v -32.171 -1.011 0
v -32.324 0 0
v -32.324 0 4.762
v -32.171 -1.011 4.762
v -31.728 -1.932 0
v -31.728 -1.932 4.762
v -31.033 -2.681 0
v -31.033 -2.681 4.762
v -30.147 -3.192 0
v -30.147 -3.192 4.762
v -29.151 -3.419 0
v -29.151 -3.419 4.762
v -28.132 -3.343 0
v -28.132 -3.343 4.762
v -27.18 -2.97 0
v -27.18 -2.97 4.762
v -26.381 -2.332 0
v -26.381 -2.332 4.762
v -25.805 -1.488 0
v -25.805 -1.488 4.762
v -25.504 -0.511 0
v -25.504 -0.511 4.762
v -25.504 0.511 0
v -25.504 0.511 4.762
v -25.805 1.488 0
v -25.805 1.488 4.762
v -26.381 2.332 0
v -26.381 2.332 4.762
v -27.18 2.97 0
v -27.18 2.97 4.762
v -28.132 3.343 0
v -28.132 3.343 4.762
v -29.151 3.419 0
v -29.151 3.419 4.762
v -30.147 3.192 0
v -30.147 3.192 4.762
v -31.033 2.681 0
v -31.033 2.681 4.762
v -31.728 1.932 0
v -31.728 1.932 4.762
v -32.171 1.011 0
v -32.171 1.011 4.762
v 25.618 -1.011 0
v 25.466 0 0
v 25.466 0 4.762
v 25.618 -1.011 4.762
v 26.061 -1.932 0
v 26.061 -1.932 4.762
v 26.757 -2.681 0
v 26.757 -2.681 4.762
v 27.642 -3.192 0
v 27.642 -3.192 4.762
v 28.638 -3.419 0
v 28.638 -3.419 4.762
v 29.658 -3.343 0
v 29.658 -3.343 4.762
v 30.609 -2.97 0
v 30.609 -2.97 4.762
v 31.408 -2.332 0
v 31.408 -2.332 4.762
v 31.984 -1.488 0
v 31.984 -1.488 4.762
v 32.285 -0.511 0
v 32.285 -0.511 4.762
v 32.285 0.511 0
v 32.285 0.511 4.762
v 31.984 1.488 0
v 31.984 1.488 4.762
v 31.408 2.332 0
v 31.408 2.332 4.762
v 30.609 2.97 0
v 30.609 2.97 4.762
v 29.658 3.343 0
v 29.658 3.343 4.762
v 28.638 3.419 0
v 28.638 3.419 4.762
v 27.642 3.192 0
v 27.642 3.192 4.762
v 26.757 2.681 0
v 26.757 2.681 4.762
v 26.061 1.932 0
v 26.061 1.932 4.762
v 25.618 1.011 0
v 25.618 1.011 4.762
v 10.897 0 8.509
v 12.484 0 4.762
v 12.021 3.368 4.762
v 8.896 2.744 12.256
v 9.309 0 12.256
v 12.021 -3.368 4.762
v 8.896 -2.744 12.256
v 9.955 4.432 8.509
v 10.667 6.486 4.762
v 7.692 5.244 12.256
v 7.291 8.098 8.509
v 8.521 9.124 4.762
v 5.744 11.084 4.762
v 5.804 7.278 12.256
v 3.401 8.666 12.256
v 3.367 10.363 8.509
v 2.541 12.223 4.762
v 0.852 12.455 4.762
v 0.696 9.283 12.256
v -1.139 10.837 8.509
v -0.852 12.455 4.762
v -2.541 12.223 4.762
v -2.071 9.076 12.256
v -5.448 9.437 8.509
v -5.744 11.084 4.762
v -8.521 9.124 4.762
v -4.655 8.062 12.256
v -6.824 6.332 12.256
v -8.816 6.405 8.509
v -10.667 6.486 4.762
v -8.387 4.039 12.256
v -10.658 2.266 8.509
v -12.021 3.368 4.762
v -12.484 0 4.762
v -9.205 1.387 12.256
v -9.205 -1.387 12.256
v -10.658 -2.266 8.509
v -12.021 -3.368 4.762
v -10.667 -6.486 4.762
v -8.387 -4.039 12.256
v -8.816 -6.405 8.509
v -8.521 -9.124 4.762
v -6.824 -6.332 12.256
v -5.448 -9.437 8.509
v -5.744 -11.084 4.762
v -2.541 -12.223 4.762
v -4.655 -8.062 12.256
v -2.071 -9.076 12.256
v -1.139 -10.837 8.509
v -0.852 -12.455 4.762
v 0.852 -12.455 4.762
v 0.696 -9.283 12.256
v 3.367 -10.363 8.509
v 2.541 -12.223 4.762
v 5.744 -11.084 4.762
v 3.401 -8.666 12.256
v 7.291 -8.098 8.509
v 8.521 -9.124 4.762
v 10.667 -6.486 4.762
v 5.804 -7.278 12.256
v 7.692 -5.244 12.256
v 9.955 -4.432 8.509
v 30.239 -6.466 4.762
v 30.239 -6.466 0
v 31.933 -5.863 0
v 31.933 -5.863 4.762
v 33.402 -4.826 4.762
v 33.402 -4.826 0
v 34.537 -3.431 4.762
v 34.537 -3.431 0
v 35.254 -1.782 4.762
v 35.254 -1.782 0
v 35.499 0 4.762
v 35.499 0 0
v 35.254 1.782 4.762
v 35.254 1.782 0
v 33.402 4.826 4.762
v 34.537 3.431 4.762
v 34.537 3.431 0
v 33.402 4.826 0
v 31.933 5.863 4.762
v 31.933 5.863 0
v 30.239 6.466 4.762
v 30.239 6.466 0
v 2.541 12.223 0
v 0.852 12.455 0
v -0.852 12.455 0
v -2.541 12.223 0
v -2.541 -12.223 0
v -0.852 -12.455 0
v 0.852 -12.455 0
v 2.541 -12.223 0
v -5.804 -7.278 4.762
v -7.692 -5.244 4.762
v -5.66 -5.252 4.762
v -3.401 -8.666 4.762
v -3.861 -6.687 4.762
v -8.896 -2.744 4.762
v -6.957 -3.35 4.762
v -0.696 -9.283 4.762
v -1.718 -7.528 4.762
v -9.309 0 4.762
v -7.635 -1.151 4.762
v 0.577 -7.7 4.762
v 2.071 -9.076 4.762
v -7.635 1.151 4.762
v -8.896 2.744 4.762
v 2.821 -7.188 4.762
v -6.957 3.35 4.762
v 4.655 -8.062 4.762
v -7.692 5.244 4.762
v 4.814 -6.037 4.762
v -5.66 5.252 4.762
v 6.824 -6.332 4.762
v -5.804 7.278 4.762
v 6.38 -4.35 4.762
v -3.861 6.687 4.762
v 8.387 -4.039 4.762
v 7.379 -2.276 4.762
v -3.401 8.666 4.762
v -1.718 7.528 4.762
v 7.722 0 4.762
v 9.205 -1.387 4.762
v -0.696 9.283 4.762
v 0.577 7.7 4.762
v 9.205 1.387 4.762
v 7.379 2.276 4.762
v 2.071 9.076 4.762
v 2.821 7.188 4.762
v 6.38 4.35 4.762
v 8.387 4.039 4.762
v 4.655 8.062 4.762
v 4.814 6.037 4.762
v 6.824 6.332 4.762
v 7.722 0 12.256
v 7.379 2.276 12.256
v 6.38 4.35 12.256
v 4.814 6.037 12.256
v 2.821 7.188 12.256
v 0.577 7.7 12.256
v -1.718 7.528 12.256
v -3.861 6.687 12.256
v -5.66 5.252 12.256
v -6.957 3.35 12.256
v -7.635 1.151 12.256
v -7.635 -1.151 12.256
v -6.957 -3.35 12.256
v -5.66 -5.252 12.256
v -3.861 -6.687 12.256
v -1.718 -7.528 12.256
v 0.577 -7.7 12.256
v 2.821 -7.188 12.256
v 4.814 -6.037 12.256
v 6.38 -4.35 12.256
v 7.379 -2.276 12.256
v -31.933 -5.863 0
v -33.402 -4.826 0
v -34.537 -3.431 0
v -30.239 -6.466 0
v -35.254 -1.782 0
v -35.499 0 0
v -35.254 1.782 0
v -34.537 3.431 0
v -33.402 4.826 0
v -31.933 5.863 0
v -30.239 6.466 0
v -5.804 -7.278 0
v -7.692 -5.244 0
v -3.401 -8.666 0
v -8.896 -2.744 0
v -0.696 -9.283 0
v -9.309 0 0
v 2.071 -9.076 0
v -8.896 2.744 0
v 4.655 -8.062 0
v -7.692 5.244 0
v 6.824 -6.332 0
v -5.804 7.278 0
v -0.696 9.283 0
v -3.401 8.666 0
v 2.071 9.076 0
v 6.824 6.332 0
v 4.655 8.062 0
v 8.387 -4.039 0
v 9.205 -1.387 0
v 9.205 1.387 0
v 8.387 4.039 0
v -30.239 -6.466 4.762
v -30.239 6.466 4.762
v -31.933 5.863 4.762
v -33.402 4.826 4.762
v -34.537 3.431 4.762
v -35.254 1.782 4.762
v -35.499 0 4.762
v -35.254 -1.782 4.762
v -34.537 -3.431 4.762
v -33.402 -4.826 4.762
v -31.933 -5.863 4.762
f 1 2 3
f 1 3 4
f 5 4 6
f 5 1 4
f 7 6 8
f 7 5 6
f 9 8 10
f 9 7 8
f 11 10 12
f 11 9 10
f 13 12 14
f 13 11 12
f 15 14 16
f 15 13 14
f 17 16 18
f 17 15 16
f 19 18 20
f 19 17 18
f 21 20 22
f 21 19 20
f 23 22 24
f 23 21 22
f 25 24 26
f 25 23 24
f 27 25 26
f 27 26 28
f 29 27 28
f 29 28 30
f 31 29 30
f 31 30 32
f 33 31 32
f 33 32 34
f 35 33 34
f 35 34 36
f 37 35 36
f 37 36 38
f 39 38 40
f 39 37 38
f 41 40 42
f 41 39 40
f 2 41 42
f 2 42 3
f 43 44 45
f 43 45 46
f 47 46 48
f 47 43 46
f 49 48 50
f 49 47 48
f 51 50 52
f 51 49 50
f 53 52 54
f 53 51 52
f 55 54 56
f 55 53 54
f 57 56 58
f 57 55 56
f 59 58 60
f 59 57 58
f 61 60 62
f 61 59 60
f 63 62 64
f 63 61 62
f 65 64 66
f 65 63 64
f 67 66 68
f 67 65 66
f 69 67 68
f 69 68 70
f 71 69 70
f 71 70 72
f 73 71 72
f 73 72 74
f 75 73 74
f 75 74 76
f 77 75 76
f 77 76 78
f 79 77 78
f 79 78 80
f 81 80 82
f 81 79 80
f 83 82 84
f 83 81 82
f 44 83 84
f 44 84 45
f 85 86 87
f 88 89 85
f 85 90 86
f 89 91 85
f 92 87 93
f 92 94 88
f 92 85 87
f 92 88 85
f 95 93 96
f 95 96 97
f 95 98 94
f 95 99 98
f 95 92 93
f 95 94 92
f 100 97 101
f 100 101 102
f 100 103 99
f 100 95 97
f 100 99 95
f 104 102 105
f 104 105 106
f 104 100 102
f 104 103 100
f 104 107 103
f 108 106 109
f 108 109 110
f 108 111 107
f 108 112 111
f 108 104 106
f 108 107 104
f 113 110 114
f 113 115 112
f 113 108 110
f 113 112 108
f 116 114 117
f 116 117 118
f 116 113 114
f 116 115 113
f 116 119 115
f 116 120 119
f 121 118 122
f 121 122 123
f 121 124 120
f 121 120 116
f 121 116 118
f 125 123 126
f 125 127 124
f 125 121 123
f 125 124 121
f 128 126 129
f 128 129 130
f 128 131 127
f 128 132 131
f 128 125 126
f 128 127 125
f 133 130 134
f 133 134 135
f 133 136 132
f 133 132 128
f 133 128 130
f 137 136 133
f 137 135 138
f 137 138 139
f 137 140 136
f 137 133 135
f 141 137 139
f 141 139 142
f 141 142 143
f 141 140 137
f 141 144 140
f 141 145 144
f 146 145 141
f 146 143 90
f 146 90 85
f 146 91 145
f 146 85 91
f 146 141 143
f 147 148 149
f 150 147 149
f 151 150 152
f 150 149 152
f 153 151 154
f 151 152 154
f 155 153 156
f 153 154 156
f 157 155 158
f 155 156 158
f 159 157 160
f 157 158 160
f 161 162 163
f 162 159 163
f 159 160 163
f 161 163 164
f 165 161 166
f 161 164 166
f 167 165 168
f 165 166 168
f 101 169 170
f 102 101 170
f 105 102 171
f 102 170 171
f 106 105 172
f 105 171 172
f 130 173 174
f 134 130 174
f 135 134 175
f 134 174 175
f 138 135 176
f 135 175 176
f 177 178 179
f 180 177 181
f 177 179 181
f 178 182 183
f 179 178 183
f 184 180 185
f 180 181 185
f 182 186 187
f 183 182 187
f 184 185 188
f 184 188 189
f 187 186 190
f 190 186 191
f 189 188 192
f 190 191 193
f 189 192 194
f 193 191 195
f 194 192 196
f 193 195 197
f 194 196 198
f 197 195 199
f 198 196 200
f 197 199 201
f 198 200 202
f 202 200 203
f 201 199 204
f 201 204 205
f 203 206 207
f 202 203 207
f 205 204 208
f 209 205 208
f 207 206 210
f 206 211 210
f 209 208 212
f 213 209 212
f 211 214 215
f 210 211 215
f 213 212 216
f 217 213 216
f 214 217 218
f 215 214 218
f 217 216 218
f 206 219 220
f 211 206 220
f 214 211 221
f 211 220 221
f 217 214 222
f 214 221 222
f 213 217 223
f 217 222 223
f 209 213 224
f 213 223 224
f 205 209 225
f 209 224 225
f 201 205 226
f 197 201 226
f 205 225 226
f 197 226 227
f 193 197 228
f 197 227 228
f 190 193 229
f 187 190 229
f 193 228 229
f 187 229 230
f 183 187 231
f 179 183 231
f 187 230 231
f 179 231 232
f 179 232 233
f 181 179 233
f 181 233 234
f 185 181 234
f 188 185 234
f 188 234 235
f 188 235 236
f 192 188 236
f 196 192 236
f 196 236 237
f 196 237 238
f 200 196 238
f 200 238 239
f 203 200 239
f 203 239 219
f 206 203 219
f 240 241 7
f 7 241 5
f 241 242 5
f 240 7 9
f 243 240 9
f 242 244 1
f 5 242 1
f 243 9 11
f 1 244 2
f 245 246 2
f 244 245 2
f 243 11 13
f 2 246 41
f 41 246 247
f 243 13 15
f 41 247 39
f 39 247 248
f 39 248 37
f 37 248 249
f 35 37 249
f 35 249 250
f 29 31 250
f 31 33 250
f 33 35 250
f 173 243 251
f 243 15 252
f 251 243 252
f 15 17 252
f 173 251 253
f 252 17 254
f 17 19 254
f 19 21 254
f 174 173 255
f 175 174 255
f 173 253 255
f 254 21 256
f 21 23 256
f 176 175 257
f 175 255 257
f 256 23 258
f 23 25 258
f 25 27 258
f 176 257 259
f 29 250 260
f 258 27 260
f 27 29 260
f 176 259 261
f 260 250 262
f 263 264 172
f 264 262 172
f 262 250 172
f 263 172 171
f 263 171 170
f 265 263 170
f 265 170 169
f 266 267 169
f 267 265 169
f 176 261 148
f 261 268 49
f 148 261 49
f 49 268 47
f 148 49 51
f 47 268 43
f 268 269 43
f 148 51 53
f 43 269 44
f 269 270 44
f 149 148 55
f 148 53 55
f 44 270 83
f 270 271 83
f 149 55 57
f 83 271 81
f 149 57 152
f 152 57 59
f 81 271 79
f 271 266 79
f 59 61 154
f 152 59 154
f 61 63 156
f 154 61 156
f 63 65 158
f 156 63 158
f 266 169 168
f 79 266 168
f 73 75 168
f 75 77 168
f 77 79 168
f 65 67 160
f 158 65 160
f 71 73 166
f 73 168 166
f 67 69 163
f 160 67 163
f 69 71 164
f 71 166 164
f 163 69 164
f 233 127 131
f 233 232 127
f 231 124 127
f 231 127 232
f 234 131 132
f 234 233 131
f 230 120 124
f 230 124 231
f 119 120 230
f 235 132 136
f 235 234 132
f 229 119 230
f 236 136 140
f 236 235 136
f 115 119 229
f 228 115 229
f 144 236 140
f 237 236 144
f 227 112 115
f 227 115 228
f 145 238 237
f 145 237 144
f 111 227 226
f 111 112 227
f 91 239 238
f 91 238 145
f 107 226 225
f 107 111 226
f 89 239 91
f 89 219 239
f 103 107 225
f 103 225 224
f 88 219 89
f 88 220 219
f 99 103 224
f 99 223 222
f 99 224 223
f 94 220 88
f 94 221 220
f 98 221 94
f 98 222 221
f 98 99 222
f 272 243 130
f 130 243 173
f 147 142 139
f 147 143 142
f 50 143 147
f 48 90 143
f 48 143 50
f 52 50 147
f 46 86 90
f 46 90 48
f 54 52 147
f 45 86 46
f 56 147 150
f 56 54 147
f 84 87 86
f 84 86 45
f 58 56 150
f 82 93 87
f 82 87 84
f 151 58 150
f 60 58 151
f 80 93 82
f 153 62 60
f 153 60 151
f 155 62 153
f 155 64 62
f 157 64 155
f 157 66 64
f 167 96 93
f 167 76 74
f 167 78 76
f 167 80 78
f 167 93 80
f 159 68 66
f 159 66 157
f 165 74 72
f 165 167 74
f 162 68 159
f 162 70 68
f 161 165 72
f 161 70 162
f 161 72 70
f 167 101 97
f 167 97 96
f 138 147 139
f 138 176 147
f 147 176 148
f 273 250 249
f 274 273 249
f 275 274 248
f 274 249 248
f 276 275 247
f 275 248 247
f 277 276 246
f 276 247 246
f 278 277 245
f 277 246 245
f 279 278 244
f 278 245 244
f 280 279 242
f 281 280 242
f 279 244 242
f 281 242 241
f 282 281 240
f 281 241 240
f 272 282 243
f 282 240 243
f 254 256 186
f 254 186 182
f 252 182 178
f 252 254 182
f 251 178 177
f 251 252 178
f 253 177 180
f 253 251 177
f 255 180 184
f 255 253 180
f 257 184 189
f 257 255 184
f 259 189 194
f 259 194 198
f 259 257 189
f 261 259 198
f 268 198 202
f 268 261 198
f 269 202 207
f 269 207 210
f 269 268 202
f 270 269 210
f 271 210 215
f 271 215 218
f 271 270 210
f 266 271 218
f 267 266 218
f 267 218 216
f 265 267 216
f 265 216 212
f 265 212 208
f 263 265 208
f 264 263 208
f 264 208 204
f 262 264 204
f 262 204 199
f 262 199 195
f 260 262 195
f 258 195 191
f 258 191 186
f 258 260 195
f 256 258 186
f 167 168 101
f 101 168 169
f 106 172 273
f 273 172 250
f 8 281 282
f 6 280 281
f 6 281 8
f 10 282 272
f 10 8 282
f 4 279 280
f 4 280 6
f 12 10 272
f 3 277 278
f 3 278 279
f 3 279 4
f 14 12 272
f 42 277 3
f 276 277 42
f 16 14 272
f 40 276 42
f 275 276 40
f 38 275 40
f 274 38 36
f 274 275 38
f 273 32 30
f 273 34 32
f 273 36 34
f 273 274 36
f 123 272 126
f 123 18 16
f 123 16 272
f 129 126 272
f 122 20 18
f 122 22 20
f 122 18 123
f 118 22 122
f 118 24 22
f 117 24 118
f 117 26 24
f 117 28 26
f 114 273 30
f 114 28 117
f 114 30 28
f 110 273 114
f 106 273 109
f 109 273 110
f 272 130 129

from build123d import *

# Parameters (mm, degrees)
SKETCH1_R           = 6.604
SKETCH1_R_2         = 3.429
SKETCH1_R_3         = 12.4841
SKETCH1_R_4         = 9.3091
BOSS_EXTRUDE1_DEPTH = 4.7625
SKETCH3_R           = 12.4841
SKETCH2_R           = 9.3091
SKETCH5_R           = 7.7216
CUT_EXTRUDE1_DEPTH  = 40.575251945


with BuildPart() as part:
    # Sketch1 → Boss-Extrude1 (new body)
    # profile 1 of 5: a face of its own
    with BuildSketch(Plane.XY):
        with Locations((-28.894599, 0)):
            Circle(SKETCH1_R)
        with Locations(Location((-28.894599, 0, 0), (0, 0, 180))):
            Circle(SKETCH1_R_2, mode=Mode.SUBTRACT)
    # profile 2 of 5: a face of its own
    with BuildSketch(Plane.XY):
        with BuildLine():
            Line((-2.540535565, 12.222865124), (-30.238524223, 6.465808611))
            ThreePointArc((-30.238524223, 6.465808611), (-24.727013738, 5.1228946), (-22.290599, 0))
            ThreePointArc((-22.290599, 0), (-24.727013738, -5.1228946), (-30.238524223, -6.465808611))
            Line((-30.238524223, -6.465808611), (-2.540535565, -12.222865124))
            ThreePointArc((-2.540535565, -12.222865124), (-12.4841, 0), (-2.540535565, 12.222865124))
        make_face()
    # profile 3 of 5: a face of its own
    with BuildSketch(Plane.XY):
        Circle(SKETCH1_R_3)
        with Locations(Location((0, 0, 0), (0, 0, 180))):
            Circle(SKETCH1_R_4, mode=Mode.SUBTRACT)
    # profile 4 of 5: a face of its own
    with BuildSketch(Plane.XY):
        with BuildLine():
            Line((30.238524223, 6.465808611), (2.540535565, 12.222865124))
            ThreePointArc((2.540535565, 12.222865124), (9.684241139, 7.878339062), (12.4841, 0))
            ThreePointArc((12.4841, 0), (9.684241139, -7.878339062), (2.540535565, -12.222865124))
            Line((2.540535565, -12.222865124), (30.238524223, -6.465808611))
            ThreePointArc((30.238524223, -6.465808611), (22.290599, 0), (30.238524223, 6.465808611))
        make_face()
    # profile 5 of 5: a face of its own
    with BuildSketch(Plane.XY):
        with Locations((28.894599, 0)):
            Circle(SKETCH1_R)
        with Locations(Location((28.894599, 0, 0), (0, 0, 180))):
            Circle(SKETCH1_R_2, mode=Mode.SUBTRACT)
    extrude(amount=BOSS_EXTRUDE1_DEPTH)

    # Sketch3 → Loft3 section 0
    with BuildSketch(Plane.XY.offset(4.7625)):
        Circle(SKETCH3_R)
    # Sketch2 → Loft3 section 1
    with BuildSketch(Plane.XY.offset(12.2555)):
        Circle(SKETCH2_R)
    loft()

    # Sketch5 → Cut-Extrude1 (cut, through all)
    with BuildSketch(Plane.XY.offset(12.2555)):
        Circle(SKETCH5_R)
    extrude(amount=-CUT_EXTRUDE1_DEPTH, mode=Mode.SUBTRACT)


solid = part.part
